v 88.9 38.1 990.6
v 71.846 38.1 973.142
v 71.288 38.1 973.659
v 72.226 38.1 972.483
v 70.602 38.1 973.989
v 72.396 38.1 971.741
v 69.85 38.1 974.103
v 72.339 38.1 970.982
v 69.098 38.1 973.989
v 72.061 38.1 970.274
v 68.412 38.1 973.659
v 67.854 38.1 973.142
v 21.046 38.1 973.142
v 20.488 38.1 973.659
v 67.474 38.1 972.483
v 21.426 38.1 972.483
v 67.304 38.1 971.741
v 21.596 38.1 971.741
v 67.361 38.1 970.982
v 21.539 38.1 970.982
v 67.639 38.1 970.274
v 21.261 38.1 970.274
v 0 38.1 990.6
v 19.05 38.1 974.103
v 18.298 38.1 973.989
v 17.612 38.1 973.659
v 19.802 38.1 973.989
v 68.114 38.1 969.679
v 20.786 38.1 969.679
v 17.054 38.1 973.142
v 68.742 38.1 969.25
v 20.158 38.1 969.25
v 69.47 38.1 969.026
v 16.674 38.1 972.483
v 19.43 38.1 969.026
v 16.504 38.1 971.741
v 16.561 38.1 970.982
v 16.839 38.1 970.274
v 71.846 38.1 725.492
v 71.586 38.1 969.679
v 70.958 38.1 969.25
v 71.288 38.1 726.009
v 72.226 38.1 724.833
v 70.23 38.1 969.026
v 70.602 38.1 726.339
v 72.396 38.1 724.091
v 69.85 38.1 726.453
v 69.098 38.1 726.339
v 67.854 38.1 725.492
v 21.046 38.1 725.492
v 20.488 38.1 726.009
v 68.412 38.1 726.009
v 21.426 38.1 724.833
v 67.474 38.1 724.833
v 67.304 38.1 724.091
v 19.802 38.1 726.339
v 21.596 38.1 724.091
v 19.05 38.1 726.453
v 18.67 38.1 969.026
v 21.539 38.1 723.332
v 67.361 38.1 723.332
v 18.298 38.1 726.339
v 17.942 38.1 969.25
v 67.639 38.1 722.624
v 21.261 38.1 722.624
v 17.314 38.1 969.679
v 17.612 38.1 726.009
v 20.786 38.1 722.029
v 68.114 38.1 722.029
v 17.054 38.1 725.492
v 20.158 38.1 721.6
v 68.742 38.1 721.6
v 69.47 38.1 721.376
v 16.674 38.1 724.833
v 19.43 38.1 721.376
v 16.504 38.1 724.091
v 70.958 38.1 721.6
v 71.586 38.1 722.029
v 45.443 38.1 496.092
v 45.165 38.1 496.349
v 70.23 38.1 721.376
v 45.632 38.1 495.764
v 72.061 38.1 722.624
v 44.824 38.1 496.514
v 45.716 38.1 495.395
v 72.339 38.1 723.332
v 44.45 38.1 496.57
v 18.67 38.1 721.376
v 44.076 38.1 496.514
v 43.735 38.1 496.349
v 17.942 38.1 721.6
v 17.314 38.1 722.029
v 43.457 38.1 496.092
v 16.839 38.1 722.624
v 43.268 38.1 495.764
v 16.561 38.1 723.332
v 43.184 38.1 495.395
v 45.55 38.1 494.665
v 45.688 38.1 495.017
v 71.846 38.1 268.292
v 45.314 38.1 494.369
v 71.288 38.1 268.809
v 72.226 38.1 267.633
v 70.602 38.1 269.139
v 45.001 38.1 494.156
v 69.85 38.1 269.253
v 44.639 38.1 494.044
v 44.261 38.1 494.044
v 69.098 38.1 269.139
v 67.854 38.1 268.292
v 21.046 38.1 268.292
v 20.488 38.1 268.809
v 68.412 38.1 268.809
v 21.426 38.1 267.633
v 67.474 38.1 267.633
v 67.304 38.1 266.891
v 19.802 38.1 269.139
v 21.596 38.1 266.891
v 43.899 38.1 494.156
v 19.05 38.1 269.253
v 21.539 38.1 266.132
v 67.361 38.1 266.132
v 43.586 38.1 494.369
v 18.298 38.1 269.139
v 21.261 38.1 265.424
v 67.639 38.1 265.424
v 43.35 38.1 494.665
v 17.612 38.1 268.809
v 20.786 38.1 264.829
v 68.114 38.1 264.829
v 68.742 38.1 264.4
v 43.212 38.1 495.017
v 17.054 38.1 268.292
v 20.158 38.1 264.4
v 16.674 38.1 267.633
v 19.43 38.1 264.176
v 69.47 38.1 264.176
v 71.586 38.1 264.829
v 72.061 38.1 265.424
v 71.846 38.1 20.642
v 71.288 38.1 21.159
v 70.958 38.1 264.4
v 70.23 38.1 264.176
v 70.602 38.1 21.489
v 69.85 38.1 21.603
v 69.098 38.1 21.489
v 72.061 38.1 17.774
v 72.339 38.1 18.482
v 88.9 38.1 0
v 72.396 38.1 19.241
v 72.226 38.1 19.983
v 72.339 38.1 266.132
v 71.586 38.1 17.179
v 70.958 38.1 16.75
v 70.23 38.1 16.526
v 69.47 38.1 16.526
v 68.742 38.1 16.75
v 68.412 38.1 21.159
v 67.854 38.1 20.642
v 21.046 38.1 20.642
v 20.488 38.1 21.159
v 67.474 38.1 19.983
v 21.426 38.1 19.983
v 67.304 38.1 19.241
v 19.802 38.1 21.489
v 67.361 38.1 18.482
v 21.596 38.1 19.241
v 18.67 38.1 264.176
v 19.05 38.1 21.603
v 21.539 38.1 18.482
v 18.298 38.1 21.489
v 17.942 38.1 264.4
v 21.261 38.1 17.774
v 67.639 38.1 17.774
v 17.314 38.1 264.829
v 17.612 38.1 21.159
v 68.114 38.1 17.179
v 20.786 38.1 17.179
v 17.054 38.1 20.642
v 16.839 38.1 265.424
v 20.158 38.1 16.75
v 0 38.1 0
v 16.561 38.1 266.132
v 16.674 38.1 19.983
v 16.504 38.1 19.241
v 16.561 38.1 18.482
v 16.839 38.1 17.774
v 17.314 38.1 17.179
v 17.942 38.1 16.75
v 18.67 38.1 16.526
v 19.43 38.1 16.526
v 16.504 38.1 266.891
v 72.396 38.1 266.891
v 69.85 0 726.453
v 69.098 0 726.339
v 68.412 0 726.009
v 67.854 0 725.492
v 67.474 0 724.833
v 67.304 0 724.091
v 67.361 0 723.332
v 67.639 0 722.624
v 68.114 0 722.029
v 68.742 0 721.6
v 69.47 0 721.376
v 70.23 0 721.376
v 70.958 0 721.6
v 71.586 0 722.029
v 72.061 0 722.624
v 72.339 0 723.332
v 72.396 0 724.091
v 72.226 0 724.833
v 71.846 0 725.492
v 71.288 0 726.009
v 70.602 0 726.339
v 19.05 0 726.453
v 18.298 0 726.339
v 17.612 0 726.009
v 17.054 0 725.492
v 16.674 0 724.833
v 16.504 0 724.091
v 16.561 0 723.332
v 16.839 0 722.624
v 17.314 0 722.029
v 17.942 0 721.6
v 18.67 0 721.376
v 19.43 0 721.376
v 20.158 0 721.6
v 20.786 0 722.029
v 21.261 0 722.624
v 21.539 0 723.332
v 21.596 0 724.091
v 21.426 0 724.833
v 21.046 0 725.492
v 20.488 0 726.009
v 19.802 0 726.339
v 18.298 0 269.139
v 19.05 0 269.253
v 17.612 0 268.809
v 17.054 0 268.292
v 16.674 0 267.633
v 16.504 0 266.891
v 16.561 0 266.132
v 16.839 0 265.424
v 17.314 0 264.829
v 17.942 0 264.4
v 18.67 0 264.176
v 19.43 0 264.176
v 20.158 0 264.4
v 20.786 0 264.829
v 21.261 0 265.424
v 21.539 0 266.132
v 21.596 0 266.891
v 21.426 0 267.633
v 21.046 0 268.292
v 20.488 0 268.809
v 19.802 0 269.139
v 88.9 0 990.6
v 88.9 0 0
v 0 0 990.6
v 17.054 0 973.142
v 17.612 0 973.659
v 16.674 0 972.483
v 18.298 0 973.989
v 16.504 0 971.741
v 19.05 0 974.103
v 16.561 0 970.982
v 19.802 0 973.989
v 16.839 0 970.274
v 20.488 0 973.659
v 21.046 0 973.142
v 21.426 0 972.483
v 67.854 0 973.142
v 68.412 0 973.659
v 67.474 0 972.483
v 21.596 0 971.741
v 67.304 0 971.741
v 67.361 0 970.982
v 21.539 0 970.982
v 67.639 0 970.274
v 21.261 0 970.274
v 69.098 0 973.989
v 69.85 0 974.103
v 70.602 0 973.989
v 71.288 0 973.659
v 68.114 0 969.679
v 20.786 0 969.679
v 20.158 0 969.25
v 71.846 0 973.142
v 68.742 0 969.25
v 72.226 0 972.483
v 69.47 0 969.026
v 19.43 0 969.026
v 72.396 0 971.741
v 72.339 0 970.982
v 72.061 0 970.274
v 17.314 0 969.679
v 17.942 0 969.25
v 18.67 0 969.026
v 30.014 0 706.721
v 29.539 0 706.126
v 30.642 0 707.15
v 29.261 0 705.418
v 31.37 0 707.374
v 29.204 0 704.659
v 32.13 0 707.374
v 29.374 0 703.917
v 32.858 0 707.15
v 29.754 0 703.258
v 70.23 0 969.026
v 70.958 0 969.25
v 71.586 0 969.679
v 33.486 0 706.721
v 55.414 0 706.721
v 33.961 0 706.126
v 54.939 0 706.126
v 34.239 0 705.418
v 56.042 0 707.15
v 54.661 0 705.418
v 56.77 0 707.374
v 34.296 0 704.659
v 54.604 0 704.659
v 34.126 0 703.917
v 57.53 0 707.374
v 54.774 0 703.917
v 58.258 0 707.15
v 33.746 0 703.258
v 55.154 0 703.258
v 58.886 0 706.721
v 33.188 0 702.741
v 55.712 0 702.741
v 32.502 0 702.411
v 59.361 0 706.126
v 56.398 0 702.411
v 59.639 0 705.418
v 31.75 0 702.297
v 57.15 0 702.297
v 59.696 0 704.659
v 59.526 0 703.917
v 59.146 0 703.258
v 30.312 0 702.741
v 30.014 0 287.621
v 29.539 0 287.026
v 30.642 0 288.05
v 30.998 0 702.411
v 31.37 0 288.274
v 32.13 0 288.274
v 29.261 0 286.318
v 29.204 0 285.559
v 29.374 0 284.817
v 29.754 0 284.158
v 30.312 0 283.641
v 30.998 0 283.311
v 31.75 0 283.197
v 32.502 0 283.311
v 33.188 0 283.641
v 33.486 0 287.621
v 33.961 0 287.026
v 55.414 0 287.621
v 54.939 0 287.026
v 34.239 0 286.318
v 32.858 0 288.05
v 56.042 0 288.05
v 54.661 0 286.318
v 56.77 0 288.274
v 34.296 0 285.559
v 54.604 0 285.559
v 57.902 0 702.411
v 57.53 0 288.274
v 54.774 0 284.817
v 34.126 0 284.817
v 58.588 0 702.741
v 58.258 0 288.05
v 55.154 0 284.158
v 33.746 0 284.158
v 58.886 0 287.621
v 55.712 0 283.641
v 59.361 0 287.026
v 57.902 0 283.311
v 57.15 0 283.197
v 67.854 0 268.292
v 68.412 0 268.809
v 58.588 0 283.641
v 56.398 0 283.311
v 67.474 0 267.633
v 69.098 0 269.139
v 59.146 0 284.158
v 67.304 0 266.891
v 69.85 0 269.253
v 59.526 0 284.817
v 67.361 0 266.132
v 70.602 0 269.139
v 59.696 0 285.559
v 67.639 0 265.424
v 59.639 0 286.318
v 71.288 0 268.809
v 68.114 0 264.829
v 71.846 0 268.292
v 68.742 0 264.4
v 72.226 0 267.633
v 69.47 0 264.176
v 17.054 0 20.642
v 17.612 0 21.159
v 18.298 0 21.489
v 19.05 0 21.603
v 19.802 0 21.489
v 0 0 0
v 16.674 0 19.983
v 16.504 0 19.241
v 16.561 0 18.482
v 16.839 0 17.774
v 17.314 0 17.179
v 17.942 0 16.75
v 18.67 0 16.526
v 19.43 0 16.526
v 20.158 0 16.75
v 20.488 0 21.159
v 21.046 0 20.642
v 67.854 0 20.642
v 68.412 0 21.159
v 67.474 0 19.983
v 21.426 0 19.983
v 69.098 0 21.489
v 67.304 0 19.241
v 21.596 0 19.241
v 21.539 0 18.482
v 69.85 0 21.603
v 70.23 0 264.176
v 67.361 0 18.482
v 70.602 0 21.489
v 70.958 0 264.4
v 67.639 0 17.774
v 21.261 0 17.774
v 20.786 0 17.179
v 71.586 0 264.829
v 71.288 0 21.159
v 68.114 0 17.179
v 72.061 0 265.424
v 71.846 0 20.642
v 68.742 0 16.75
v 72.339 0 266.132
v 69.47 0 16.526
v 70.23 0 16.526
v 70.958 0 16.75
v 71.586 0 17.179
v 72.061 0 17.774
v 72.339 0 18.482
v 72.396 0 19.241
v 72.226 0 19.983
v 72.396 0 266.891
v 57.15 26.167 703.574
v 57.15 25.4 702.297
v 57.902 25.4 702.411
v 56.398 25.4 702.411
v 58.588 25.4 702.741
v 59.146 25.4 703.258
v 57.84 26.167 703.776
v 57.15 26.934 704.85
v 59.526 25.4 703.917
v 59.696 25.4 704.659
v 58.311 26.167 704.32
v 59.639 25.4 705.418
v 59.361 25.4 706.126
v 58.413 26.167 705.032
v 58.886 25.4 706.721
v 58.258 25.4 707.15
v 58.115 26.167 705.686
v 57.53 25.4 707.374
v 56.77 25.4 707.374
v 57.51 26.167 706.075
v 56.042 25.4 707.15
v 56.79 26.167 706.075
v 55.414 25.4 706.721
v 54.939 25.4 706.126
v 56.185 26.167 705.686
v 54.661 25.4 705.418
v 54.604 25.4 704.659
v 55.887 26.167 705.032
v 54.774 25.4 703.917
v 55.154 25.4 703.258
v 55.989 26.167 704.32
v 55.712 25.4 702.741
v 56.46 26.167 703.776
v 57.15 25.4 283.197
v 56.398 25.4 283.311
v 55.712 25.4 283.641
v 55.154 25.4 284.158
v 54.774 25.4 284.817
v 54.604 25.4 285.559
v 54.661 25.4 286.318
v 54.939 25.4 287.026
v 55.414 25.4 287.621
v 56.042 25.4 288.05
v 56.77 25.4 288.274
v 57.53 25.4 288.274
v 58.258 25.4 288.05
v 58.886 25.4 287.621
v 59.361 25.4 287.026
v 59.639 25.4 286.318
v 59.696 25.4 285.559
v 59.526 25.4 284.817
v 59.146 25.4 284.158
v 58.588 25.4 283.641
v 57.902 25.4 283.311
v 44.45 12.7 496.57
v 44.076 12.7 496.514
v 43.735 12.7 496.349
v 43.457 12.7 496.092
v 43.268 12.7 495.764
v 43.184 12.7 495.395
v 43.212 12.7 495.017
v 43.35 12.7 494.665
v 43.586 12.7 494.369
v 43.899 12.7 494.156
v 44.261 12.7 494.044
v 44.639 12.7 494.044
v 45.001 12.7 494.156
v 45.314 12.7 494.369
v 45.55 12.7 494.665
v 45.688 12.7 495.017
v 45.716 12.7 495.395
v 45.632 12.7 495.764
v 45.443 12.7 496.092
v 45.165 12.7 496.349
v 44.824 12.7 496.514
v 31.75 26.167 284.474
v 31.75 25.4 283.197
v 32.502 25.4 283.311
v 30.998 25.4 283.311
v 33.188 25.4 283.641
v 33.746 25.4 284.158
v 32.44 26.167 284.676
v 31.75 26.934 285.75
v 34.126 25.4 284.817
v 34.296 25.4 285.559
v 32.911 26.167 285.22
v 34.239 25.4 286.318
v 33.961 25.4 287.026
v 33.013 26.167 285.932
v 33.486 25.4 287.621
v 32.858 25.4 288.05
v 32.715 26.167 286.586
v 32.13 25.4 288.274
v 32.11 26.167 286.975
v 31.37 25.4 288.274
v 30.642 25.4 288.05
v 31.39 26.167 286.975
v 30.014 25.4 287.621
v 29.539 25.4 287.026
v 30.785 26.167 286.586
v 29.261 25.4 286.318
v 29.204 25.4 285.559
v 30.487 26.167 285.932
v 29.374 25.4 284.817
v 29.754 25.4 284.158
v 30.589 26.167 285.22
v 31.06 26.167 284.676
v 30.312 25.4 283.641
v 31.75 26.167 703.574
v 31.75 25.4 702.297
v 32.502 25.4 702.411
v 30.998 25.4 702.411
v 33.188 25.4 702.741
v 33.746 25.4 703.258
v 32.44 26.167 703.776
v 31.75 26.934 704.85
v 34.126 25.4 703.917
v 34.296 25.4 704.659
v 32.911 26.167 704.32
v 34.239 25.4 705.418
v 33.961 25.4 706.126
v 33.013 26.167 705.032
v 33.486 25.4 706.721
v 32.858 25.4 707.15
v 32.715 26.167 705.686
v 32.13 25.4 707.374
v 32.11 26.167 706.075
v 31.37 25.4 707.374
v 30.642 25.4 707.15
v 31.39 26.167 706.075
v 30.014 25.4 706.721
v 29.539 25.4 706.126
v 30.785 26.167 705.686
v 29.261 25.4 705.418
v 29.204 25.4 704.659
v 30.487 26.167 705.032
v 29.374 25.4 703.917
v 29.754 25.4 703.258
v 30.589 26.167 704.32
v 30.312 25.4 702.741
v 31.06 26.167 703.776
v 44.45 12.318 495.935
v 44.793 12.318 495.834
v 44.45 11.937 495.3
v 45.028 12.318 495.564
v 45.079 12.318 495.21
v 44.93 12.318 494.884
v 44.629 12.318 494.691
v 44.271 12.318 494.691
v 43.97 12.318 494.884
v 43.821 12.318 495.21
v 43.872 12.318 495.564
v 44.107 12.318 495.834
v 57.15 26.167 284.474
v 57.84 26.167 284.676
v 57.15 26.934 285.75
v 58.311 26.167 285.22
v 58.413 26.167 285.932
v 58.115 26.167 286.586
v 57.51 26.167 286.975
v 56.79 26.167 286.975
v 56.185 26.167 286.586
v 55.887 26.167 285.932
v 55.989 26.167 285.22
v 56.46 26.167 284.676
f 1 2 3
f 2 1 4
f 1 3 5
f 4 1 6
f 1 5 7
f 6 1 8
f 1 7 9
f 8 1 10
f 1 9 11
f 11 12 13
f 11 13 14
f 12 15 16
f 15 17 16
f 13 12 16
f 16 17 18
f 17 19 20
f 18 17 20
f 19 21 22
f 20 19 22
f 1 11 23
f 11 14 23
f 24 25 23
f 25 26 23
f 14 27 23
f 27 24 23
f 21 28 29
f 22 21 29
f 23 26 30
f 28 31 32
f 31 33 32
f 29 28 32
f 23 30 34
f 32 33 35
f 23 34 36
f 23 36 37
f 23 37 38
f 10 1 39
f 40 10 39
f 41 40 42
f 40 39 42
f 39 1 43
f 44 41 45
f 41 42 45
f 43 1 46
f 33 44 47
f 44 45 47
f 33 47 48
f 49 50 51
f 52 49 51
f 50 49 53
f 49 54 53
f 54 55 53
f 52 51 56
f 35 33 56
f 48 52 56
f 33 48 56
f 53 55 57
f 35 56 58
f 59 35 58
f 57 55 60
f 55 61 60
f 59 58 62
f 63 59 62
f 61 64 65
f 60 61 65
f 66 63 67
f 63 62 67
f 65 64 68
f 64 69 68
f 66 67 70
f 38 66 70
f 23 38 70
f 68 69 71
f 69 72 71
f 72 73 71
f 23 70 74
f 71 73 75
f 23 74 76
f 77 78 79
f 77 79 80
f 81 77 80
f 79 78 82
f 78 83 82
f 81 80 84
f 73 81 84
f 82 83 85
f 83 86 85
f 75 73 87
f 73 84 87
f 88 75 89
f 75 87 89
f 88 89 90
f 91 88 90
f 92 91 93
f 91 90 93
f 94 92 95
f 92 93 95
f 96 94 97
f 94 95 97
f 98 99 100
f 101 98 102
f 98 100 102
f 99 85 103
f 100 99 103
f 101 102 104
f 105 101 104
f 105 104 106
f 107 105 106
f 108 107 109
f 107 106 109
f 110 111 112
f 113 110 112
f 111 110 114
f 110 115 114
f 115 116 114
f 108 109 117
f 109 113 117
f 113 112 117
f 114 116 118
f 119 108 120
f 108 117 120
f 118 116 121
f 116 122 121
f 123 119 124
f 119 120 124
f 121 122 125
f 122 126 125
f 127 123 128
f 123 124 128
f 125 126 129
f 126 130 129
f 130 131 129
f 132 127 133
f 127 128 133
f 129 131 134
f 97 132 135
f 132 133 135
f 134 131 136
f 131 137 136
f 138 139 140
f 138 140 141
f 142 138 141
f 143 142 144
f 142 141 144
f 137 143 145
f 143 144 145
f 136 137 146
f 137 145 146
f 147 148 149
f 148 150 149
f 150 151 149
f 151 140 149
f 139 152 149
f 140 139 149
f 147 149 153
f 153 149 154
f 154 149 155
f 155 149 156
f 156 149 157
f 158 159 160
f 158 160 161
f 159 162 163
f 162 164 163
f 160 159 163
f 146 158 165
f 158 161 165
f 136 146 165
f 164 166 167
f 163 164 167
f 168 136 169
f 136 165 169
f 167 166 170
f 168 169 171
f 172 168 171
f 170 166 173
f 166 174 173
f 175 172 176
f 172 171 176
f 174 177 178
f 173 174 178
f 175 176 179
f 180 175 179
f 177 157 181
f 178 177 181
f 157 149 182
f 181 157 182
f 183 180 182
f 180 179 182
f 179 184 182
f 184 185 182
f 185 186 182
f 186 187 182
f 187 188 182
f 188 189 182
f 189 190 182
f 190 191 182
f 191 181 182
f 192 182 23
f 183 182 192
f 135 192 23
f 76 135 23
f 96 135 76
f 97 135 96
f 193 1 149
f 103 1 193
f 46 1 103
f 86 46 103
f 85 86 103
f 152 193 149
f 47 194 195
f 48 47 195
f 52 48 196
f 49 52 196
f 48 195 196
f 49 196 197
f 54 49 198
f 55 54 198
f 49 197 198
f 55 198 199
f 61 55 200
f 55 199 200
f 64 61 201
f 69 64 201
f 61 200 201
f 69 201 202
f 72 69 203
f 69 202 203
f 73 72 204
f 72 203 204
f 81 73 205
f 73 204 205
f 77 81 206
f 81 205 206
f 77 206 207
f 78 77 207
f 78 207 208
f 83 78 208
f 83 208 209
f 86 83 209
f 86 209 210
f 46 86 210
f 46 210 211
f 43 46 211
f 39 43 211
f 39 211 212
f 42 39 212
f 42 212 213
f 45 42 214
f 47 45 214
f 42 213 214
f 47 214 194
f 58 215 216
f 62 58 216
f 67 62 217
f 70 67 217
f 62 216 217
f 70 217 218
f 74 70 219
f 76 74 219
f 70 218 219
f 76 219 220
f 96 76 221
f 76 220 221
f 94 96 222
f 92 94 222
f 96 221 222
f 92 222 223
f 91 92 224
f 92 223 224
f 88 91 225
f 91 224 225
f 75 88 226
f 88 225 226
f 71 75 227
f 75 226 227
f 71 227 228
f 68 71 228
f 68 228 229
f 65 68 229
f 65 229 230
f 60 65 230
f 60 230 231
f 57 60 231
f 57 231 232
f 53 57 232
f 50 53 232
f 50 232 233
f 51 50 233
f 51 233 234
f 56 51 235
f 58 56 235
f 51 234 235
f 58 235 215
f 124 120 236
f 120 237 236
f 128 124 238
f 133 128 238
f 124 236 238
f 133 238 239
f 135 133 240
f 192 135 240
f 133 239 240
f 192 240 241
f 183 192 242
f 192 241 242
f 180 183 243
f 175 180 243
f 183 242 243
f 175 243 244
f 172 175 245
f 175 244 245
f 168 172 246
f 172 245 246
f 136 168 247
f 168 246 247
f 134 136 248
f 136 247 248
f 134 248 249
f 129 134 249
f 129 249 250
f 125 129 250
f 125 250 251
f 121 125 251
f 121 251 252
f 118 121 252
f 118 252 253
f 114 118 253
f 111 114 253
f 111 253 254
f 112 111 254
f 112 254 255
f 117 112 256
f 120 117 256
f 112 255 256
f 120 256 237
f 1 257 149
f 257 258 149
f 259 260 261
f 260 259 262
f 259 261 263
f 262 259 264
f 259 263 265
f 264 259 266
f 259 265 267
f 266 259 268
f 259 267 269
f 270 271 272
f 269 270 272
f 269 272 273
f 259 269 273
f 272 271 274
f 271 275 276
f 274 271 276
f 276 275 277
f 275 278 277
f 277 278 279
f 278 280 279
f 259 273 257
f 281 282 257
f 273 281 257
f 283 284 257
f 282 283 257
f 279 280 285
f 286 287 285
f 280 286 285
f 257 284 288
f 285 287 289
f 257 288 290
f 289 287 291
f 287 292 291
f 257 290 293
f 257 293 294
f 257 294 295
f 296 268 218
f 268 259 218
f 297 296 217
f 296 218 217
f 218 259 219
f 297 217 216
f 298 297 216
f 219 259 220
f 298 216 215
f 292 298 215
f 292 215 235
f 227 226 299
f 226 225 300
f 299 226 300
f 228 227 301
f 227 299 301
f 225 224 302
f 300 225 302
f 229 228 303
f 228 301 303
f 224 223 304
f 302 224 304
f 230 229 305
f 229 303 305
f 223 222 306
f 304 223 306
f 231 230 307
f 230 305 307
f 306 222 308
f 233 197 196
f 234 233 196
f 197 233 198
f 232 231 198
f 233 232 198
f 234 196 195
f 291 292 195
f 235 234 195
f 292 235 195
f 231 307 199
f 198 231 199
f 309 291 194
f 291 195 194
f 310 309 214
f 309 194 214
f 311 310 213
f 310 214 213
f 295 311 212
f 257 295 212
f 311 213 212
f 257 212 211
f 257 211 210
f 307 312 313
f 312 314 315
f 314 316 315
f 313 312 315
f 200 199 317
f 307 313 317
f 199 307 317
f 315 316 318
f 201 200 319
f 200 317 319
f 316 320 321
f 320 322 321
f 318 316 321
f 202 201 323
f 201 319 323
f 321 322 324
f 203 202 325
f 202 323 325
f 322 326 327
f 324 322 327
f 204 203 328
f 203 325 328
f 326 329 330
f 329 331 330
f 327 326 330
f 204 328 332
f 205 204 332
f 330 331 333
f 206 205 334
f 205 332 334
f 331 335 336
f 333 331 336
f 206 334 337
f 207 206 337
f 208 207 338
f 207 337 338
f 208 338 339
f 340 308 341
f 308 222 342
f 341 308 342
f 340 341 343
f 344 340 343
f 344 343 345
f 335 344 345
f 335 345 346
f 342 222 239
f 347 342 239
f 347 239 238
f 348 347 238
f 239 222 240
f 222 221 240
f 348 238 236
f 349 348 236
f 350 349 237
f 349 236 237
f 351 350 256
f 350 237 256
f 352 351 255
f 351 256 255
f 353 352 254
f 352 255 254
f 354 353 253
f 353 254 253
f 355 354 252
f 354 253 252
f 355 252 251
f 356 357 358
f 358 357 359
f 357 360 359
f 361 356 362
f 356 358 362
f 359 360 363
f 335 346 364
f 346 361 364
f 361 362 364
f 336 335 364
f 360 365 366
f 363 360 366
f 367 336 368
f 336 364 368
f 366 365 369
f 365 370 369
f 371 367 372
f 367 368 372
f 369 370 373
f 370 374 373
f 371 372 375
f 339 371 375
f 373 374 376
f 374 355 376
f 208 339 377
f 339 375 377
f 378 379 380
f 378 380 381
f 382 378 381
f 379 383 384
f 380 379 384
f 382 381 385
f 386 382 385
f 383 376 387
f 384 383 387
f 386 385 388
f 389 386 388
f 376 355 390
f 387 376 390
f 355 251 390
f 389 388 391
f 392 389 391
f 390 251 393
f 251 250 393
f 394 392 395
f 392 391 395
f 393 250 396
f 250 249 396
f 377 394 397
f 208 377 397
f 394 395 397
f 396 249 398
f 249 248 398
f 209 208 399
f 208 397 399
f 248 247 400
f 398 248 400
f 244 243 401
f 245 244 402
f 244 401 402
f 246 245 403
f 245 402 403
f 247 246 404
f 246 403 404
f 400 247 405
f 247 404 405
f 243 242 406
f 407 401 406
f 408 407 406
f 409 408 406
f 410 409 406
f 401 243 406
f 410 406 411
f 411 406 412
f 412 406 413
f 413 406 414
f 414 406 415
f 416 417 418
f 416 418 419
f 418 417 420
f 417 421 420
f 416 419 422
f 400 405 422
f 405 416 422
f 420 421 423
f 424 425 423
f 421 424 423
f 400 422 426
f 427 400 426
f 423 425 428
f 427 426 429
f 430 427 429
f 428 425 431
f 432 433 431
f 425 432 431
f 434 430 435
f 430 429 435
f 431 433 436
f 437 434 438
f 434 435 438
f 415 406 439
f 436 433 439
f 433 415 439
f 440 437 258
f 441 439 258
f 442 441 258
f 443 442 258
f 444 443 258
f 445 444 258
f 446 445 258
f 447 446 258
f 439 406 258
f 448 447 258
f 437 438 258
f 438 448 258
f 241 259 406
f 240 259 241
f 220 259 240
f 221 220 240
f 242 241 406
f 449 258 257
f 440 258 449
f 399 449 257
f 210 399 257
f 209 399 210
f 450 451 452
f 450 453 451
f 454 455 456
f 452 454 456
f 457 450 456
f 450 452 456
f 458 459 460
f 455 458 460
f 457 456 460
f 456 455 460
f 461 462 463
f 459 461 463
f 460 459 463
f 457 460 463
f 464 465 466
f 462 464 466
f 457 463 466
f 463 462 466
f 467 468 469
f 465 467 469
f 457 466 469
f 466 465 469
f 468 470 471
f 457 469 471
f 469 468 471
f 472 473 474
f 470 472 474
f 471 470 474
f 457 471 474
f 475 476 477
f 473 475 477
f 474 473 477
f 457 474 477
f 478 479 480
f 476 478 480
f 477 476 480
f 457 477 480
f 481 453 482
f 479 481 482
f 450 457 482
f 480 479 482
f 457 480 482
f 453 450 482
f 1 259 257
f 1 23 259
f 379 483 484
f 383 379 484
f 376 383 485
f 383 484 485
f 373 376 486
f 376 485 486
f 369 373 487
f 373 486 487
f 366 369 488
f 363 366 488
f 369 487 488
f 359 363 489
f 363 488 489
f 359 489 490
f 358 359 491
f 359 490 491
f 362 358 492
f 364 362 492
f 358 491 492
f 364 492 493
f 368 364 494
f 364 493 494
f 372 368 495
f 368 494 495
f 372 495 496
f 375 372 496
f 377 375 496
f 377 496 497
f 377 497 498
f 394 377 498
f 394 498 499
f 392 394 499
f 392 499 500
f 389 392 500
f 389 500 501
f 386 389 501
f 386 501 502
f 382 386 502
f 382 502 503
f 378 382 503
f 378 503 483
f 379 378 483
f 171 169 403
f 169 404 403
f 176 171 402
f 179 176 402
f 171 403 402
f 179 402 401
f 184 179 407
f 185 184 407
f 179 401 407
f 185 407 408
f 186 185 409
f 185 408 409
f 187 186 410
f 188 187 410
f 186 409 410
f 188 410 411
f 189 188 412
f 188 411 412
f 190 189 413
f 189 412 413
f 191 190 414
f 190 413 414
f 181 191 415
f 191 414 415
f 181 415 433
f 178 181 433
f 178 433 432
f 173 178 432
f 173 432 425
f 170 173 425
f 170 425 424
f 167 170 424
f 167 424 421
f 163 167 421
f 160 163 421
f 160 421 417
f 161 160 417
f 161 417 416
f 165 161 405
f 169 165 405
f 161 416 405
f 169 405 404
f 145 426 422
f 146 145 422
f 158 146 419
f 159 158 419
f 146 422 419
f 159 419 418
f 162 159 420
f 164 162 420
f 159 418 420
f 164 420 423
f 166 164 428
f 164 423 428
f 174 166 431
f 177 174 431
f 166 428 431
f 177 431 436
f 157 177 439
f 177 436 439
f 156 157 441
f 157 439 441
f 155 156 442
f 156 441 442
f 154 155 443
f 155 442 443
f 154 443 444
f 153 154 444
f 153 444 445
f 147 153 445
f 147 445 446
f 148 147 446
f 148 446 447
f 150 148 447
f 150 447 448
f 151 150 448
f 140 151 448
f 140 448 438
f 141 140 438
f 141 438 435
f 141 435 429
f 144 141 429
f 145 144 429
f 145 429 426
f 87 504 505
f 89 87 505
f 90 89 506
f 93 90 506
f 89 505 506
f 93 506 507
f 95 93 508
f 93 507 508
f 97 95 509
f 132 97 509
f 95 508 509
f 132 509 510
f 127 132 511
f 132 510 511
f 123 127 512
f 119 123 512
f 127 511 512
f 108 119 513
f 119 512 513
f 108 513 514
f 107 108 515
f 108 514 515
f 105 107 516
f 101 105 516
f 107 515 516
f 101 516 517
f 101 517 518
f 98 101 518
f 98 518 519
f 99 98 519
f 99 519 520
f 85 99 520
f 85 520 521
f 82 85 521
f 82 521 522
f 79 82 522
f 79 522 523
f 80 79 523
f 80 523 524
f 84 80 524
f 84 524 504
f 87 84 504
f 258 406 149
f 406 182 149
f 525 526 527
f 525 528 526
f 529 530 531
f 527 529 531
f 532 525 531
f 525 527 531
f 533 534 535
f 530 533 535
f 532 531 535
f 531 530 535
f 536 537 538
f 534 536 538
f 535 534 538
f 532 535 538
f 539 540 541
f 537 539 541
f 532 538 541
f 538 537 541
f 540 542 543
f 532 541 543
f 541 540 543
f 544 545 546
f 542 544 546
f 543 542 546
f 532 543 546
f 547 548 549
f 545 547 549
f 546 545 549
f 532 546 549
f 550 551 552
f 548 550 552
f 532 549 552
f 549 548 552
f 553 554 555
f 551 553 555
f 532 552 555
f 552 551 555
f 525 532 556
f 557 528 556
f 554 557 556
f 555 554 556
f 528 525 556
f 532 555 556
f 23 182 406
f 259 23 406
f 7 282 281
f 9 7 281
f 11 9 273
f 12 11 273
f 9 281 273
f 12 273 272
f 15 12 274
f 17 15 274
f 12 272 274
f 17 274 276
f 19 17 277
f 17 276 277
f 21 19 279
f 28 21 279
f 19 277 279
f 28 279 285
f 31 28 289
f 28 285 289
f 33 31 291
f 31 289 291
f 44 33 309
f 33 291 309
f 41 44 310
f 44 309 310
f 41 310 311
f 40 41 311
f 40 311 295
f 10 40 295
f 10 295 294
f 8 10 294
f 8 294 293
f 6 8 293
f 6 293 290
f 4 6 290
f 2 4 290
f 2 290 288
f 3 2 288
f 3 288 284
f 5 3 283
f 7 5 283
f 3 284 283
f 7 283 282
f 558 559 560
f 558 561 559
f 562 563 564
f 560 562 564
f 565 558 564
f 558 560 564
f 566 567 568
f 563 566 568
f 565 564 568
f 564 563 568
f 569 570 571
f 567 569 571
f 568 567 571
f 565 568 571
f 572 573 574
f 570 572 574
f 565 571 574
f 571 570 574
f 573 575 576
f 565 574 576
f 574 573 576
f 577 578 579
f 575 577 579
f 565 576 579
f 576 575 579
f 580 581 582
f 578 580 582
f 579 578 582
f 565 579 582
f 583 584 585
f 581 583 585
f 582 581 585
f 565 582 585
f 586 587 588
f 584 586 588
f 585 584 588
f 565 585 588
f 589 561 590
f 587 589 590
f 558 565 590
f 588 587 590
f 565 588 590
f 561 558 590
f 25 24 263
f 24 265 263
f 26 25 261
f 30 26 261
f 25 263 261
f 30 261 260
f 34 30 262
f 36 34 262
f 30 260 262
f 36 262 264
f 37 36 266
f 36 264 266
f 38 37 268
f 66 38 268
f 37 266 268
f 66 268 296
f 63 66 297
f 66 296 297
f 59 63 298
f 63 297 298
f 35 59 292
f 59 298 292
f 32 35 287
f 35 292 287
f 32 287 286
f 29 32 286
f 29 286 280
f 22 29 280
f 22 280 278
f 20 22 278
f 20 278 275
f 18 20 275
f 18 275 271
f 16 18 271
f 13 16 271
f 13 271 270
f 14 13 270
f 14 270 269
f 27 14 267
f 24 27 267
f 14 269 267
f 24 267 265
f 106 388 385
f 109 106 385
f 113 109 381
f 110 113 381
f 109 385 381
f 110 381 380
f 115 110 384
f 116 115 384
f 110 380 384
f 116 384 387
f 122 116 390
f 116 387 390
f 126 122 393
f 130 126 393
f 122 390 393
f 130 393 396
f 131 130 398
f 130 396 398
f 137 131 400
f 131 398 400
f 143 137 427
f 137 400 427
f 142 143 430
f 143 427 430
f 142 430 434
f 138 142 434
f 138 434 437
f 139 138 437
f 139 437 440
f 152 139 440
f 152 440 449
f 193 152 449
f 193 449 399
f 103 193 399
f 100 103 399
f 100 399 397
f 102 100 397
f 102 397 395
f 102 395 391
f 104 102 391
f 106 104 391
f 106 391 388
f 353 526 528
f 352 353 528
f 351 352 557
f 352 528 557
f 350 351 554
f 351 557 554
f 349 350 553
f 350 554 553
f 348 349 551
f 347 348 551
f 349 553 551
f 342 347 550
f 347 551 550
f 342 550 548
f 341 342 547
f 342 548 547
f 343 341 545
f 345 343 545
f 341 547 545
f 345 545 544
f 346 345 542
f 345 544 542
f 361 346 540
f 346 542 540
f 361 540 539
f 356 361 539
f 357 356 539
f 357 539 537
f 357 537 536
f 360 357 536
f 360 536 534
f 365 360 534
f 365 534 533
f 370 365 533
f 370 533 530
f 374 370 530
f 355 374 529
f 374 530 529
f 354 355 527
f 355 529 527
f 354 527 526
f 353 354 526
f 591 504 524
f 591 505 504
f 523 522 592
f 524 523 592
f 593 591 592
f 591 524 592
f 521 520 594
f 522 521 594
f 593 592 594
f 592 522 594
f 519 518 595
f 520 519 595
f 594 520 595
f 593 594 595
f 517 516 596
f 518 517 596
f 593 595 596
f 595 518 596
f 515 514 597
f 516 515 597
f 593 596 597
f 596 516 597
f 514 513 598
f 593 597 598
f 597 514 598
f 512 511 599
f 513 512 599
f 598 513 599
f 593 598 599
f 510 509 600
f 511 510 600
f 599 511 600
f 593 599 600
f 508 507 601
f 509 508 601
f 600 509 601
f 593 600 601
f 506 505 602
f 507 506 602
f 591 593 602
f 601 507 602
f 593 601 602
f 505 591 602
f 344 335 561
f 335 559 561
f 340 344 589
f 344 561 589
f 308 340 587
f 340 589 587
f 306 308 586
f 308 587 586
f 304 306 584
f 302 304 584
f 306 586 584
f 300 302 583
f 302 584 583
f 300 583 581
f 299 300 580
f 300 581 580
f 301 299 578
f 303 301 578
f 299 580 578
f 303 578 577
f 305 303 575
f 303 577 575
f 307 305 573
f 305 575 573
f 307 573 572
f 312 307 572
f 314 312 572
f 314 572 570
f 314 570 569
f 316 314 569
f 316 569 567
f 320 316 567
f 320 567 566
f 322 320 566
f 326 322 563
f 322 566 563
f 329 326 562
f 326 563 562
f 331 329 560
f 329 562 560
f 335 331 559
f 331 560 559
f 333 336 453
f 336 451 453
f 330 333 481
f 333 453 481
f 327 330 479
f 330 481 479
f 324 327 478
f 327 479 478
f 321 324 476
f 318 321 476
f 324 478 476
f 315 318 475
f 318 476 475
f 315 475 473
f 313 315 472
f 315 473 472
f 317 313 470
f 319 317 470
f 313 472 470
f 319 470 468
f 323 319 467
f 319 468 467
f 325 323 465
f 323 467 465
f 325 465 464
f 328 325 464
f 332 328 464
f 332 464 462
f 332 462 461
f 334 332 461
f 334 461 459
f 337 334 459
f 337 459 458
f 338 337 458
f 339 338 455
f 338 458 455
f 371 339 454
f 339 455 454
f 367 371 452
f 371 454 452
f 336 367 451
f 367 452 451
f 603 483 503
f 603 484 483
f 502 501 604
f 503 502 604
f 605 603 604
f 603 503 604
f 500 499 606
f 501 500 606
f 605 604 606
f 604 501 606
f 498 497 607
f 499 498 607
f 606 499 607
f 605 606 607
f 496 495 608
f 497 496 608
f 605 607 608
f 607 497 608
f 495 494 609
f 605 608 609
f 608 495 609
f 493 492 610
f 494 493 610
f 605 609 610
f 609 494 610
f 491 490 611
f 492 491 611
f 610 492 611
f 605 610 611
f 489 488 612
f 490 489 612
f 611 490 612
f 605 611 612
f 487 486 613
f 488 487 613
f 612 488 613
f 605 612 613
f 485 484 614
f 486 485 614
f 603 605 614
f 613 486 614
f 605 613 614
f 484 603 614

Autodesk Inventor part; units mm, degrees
ref_plane "YZ Plane" through (0, 0, 0) normal (1, 0, 0) x (0, 1, 0)
ref_plane "XZ Plane" through (0, 0, 0) normal (0, 1, 0) x (-1, 0, 0)
ref_plane "XY Plane" through (0, 0, 0) normal (0, 0, 1) x (1, 0, 0)
sketch "Sketch1" plane through (0, 0, 0) normal (0, 0, 1) x (1, 0, 0)
  line L0 (0, 0) -> (88.9, 0)
  line L1 (88.9, 0) -> (88.9, 38.1)
  line L2 (88.9, 38.1) -> (0, 38.1)
  line L3 (0, 38.1) -> (0, 0)
  point P0 (0, 0)
  dimension "d0" = 88.9
  dimension "d1" = 38.1
extrude "Extrusion1" add sketch "Sketch1" along normal blind 990.6
sketch "Sketch2" plane through (0, 38.1, 0) normal (0, 1, 0) x (1, 0, 0)
  line L0 (88.9, 0) -> (0, 0) projected
  line L1 (0, 0) -> (0, -990.6) projected
  circle A0 centre (19.05, -19.05) radius 13.4295
  circle A1 centre (69.85, -19.05) radius 13.4295
  circle A2 centre (19.05, -971.55) radius 13.4295
  circle A3 centre (69.85, -971.55) radius 13.4295
  dimension "d4" = 19.05
  dimension "d5" = 19.05
  dimension "d8" = 50.8
  dimension "d11" = 952.5
hole "Hole1" at (69.85, 38.1, 971.55) at (19.05, 38.1, 971.55) at (69.85, 38.1, 19.05) at (19.05, 38.1, 19.05) direction (0, -1, 0) diameter 5.1054 end through all clearance for "Flat Head Machine Screw (82)" size "#10" standard "Ansi Unified Screw Threads"
sketch "Sketch3" plane through (0, 38.1, 0) normal (0, 1, 0) x (1, 0, 0)
  line L0 (88.9, 0) -> (0, 0) projected
  line L1 (0, 0) -> (0, -990.6) projected
  line L2 (88.9, 0) -> (88.9, -990.6) projected
  line L3 (0, -495.3) -> (88.9, -495.3) construction
  circle A0 centre (19.05, -266.7) radius 9.489
  line L4 (50.8, -495.3) -> (139.7, -495.3) construction
  circle A1 centre (69.85, -266.7) radius 9.489
  circle A2 centre (19.05, -723.9) radius 9.489
  circle A3 centre (69.85, -723.9) radius 9.489
  dimension "d21" = 228.6
  dimension "d24" = 50.8
hole "Hole2" at (19.05, 38.1, 723.9) at (69.85, 38.1, 723.9) at (19.05, 38.1, 266.7) at (69.85, 38.1, 266.7) direction (0, -1, 0) diameter 5.1054 end through all clearance for "Flat Head Machine Screw (82)" size "#10" standard "Ansi Unified Screw Threads"
sketch "Sketch4" plane through (0, 0, 0) normal (0, -1, 0) x (1, 0, 0)
  line L0 (0, 0) -> (88.9, 0) projected
  line L1 (88.9, 0) -> (88.9, 990.6) projected
  line L2 (0, 990.6) -> (88.9, 990.6) projected
  line L3 (0, 0) -> (0, 990.6) projected
  line L4 (0, 495.3) -> (88.9, 495.3) construction
  line L5 (44.45, 990.6) -> (44.45, 0) construction
  circle A0 centre (31.75, 704.85) radius 5.059
  circle A1 centre (57.15, 704.85) radius 5.059
  circle A2 centre (31.75, 285.75) radius 5.059
  circle A3 centre (57.15, 285.75) radius 5.059
  dimension "d36" = 209.55
  dimension "d37" = 12.7
hole "Hole3" at (31.75, 0, 704.85) at (57.15, 0, 704.85) at (31.75, 0, 285.75) at (57.15, 0, 285.75) direction (0, 1, 0) diameter 5.1054 depth 25.4 tip angle 118 clearance for "Flat Head Machine Screw (82)" size "#10" standard "Ansi Unified Screw Threads"
sketch "Sketch5" plane through (0, 38.1, 0) normal (0, 1, 0) x (1, 0, 0)
  circle A0 centre (44.45, -495.3) radius 6.7726
hole "Hole4" at (44.45, 38.1, 495.3) direction (0, -1, 0) diameter 2.54 depth 25.4 tip angle 118
properties part number "hubjig_cross" material "Wood (Cherry)"
